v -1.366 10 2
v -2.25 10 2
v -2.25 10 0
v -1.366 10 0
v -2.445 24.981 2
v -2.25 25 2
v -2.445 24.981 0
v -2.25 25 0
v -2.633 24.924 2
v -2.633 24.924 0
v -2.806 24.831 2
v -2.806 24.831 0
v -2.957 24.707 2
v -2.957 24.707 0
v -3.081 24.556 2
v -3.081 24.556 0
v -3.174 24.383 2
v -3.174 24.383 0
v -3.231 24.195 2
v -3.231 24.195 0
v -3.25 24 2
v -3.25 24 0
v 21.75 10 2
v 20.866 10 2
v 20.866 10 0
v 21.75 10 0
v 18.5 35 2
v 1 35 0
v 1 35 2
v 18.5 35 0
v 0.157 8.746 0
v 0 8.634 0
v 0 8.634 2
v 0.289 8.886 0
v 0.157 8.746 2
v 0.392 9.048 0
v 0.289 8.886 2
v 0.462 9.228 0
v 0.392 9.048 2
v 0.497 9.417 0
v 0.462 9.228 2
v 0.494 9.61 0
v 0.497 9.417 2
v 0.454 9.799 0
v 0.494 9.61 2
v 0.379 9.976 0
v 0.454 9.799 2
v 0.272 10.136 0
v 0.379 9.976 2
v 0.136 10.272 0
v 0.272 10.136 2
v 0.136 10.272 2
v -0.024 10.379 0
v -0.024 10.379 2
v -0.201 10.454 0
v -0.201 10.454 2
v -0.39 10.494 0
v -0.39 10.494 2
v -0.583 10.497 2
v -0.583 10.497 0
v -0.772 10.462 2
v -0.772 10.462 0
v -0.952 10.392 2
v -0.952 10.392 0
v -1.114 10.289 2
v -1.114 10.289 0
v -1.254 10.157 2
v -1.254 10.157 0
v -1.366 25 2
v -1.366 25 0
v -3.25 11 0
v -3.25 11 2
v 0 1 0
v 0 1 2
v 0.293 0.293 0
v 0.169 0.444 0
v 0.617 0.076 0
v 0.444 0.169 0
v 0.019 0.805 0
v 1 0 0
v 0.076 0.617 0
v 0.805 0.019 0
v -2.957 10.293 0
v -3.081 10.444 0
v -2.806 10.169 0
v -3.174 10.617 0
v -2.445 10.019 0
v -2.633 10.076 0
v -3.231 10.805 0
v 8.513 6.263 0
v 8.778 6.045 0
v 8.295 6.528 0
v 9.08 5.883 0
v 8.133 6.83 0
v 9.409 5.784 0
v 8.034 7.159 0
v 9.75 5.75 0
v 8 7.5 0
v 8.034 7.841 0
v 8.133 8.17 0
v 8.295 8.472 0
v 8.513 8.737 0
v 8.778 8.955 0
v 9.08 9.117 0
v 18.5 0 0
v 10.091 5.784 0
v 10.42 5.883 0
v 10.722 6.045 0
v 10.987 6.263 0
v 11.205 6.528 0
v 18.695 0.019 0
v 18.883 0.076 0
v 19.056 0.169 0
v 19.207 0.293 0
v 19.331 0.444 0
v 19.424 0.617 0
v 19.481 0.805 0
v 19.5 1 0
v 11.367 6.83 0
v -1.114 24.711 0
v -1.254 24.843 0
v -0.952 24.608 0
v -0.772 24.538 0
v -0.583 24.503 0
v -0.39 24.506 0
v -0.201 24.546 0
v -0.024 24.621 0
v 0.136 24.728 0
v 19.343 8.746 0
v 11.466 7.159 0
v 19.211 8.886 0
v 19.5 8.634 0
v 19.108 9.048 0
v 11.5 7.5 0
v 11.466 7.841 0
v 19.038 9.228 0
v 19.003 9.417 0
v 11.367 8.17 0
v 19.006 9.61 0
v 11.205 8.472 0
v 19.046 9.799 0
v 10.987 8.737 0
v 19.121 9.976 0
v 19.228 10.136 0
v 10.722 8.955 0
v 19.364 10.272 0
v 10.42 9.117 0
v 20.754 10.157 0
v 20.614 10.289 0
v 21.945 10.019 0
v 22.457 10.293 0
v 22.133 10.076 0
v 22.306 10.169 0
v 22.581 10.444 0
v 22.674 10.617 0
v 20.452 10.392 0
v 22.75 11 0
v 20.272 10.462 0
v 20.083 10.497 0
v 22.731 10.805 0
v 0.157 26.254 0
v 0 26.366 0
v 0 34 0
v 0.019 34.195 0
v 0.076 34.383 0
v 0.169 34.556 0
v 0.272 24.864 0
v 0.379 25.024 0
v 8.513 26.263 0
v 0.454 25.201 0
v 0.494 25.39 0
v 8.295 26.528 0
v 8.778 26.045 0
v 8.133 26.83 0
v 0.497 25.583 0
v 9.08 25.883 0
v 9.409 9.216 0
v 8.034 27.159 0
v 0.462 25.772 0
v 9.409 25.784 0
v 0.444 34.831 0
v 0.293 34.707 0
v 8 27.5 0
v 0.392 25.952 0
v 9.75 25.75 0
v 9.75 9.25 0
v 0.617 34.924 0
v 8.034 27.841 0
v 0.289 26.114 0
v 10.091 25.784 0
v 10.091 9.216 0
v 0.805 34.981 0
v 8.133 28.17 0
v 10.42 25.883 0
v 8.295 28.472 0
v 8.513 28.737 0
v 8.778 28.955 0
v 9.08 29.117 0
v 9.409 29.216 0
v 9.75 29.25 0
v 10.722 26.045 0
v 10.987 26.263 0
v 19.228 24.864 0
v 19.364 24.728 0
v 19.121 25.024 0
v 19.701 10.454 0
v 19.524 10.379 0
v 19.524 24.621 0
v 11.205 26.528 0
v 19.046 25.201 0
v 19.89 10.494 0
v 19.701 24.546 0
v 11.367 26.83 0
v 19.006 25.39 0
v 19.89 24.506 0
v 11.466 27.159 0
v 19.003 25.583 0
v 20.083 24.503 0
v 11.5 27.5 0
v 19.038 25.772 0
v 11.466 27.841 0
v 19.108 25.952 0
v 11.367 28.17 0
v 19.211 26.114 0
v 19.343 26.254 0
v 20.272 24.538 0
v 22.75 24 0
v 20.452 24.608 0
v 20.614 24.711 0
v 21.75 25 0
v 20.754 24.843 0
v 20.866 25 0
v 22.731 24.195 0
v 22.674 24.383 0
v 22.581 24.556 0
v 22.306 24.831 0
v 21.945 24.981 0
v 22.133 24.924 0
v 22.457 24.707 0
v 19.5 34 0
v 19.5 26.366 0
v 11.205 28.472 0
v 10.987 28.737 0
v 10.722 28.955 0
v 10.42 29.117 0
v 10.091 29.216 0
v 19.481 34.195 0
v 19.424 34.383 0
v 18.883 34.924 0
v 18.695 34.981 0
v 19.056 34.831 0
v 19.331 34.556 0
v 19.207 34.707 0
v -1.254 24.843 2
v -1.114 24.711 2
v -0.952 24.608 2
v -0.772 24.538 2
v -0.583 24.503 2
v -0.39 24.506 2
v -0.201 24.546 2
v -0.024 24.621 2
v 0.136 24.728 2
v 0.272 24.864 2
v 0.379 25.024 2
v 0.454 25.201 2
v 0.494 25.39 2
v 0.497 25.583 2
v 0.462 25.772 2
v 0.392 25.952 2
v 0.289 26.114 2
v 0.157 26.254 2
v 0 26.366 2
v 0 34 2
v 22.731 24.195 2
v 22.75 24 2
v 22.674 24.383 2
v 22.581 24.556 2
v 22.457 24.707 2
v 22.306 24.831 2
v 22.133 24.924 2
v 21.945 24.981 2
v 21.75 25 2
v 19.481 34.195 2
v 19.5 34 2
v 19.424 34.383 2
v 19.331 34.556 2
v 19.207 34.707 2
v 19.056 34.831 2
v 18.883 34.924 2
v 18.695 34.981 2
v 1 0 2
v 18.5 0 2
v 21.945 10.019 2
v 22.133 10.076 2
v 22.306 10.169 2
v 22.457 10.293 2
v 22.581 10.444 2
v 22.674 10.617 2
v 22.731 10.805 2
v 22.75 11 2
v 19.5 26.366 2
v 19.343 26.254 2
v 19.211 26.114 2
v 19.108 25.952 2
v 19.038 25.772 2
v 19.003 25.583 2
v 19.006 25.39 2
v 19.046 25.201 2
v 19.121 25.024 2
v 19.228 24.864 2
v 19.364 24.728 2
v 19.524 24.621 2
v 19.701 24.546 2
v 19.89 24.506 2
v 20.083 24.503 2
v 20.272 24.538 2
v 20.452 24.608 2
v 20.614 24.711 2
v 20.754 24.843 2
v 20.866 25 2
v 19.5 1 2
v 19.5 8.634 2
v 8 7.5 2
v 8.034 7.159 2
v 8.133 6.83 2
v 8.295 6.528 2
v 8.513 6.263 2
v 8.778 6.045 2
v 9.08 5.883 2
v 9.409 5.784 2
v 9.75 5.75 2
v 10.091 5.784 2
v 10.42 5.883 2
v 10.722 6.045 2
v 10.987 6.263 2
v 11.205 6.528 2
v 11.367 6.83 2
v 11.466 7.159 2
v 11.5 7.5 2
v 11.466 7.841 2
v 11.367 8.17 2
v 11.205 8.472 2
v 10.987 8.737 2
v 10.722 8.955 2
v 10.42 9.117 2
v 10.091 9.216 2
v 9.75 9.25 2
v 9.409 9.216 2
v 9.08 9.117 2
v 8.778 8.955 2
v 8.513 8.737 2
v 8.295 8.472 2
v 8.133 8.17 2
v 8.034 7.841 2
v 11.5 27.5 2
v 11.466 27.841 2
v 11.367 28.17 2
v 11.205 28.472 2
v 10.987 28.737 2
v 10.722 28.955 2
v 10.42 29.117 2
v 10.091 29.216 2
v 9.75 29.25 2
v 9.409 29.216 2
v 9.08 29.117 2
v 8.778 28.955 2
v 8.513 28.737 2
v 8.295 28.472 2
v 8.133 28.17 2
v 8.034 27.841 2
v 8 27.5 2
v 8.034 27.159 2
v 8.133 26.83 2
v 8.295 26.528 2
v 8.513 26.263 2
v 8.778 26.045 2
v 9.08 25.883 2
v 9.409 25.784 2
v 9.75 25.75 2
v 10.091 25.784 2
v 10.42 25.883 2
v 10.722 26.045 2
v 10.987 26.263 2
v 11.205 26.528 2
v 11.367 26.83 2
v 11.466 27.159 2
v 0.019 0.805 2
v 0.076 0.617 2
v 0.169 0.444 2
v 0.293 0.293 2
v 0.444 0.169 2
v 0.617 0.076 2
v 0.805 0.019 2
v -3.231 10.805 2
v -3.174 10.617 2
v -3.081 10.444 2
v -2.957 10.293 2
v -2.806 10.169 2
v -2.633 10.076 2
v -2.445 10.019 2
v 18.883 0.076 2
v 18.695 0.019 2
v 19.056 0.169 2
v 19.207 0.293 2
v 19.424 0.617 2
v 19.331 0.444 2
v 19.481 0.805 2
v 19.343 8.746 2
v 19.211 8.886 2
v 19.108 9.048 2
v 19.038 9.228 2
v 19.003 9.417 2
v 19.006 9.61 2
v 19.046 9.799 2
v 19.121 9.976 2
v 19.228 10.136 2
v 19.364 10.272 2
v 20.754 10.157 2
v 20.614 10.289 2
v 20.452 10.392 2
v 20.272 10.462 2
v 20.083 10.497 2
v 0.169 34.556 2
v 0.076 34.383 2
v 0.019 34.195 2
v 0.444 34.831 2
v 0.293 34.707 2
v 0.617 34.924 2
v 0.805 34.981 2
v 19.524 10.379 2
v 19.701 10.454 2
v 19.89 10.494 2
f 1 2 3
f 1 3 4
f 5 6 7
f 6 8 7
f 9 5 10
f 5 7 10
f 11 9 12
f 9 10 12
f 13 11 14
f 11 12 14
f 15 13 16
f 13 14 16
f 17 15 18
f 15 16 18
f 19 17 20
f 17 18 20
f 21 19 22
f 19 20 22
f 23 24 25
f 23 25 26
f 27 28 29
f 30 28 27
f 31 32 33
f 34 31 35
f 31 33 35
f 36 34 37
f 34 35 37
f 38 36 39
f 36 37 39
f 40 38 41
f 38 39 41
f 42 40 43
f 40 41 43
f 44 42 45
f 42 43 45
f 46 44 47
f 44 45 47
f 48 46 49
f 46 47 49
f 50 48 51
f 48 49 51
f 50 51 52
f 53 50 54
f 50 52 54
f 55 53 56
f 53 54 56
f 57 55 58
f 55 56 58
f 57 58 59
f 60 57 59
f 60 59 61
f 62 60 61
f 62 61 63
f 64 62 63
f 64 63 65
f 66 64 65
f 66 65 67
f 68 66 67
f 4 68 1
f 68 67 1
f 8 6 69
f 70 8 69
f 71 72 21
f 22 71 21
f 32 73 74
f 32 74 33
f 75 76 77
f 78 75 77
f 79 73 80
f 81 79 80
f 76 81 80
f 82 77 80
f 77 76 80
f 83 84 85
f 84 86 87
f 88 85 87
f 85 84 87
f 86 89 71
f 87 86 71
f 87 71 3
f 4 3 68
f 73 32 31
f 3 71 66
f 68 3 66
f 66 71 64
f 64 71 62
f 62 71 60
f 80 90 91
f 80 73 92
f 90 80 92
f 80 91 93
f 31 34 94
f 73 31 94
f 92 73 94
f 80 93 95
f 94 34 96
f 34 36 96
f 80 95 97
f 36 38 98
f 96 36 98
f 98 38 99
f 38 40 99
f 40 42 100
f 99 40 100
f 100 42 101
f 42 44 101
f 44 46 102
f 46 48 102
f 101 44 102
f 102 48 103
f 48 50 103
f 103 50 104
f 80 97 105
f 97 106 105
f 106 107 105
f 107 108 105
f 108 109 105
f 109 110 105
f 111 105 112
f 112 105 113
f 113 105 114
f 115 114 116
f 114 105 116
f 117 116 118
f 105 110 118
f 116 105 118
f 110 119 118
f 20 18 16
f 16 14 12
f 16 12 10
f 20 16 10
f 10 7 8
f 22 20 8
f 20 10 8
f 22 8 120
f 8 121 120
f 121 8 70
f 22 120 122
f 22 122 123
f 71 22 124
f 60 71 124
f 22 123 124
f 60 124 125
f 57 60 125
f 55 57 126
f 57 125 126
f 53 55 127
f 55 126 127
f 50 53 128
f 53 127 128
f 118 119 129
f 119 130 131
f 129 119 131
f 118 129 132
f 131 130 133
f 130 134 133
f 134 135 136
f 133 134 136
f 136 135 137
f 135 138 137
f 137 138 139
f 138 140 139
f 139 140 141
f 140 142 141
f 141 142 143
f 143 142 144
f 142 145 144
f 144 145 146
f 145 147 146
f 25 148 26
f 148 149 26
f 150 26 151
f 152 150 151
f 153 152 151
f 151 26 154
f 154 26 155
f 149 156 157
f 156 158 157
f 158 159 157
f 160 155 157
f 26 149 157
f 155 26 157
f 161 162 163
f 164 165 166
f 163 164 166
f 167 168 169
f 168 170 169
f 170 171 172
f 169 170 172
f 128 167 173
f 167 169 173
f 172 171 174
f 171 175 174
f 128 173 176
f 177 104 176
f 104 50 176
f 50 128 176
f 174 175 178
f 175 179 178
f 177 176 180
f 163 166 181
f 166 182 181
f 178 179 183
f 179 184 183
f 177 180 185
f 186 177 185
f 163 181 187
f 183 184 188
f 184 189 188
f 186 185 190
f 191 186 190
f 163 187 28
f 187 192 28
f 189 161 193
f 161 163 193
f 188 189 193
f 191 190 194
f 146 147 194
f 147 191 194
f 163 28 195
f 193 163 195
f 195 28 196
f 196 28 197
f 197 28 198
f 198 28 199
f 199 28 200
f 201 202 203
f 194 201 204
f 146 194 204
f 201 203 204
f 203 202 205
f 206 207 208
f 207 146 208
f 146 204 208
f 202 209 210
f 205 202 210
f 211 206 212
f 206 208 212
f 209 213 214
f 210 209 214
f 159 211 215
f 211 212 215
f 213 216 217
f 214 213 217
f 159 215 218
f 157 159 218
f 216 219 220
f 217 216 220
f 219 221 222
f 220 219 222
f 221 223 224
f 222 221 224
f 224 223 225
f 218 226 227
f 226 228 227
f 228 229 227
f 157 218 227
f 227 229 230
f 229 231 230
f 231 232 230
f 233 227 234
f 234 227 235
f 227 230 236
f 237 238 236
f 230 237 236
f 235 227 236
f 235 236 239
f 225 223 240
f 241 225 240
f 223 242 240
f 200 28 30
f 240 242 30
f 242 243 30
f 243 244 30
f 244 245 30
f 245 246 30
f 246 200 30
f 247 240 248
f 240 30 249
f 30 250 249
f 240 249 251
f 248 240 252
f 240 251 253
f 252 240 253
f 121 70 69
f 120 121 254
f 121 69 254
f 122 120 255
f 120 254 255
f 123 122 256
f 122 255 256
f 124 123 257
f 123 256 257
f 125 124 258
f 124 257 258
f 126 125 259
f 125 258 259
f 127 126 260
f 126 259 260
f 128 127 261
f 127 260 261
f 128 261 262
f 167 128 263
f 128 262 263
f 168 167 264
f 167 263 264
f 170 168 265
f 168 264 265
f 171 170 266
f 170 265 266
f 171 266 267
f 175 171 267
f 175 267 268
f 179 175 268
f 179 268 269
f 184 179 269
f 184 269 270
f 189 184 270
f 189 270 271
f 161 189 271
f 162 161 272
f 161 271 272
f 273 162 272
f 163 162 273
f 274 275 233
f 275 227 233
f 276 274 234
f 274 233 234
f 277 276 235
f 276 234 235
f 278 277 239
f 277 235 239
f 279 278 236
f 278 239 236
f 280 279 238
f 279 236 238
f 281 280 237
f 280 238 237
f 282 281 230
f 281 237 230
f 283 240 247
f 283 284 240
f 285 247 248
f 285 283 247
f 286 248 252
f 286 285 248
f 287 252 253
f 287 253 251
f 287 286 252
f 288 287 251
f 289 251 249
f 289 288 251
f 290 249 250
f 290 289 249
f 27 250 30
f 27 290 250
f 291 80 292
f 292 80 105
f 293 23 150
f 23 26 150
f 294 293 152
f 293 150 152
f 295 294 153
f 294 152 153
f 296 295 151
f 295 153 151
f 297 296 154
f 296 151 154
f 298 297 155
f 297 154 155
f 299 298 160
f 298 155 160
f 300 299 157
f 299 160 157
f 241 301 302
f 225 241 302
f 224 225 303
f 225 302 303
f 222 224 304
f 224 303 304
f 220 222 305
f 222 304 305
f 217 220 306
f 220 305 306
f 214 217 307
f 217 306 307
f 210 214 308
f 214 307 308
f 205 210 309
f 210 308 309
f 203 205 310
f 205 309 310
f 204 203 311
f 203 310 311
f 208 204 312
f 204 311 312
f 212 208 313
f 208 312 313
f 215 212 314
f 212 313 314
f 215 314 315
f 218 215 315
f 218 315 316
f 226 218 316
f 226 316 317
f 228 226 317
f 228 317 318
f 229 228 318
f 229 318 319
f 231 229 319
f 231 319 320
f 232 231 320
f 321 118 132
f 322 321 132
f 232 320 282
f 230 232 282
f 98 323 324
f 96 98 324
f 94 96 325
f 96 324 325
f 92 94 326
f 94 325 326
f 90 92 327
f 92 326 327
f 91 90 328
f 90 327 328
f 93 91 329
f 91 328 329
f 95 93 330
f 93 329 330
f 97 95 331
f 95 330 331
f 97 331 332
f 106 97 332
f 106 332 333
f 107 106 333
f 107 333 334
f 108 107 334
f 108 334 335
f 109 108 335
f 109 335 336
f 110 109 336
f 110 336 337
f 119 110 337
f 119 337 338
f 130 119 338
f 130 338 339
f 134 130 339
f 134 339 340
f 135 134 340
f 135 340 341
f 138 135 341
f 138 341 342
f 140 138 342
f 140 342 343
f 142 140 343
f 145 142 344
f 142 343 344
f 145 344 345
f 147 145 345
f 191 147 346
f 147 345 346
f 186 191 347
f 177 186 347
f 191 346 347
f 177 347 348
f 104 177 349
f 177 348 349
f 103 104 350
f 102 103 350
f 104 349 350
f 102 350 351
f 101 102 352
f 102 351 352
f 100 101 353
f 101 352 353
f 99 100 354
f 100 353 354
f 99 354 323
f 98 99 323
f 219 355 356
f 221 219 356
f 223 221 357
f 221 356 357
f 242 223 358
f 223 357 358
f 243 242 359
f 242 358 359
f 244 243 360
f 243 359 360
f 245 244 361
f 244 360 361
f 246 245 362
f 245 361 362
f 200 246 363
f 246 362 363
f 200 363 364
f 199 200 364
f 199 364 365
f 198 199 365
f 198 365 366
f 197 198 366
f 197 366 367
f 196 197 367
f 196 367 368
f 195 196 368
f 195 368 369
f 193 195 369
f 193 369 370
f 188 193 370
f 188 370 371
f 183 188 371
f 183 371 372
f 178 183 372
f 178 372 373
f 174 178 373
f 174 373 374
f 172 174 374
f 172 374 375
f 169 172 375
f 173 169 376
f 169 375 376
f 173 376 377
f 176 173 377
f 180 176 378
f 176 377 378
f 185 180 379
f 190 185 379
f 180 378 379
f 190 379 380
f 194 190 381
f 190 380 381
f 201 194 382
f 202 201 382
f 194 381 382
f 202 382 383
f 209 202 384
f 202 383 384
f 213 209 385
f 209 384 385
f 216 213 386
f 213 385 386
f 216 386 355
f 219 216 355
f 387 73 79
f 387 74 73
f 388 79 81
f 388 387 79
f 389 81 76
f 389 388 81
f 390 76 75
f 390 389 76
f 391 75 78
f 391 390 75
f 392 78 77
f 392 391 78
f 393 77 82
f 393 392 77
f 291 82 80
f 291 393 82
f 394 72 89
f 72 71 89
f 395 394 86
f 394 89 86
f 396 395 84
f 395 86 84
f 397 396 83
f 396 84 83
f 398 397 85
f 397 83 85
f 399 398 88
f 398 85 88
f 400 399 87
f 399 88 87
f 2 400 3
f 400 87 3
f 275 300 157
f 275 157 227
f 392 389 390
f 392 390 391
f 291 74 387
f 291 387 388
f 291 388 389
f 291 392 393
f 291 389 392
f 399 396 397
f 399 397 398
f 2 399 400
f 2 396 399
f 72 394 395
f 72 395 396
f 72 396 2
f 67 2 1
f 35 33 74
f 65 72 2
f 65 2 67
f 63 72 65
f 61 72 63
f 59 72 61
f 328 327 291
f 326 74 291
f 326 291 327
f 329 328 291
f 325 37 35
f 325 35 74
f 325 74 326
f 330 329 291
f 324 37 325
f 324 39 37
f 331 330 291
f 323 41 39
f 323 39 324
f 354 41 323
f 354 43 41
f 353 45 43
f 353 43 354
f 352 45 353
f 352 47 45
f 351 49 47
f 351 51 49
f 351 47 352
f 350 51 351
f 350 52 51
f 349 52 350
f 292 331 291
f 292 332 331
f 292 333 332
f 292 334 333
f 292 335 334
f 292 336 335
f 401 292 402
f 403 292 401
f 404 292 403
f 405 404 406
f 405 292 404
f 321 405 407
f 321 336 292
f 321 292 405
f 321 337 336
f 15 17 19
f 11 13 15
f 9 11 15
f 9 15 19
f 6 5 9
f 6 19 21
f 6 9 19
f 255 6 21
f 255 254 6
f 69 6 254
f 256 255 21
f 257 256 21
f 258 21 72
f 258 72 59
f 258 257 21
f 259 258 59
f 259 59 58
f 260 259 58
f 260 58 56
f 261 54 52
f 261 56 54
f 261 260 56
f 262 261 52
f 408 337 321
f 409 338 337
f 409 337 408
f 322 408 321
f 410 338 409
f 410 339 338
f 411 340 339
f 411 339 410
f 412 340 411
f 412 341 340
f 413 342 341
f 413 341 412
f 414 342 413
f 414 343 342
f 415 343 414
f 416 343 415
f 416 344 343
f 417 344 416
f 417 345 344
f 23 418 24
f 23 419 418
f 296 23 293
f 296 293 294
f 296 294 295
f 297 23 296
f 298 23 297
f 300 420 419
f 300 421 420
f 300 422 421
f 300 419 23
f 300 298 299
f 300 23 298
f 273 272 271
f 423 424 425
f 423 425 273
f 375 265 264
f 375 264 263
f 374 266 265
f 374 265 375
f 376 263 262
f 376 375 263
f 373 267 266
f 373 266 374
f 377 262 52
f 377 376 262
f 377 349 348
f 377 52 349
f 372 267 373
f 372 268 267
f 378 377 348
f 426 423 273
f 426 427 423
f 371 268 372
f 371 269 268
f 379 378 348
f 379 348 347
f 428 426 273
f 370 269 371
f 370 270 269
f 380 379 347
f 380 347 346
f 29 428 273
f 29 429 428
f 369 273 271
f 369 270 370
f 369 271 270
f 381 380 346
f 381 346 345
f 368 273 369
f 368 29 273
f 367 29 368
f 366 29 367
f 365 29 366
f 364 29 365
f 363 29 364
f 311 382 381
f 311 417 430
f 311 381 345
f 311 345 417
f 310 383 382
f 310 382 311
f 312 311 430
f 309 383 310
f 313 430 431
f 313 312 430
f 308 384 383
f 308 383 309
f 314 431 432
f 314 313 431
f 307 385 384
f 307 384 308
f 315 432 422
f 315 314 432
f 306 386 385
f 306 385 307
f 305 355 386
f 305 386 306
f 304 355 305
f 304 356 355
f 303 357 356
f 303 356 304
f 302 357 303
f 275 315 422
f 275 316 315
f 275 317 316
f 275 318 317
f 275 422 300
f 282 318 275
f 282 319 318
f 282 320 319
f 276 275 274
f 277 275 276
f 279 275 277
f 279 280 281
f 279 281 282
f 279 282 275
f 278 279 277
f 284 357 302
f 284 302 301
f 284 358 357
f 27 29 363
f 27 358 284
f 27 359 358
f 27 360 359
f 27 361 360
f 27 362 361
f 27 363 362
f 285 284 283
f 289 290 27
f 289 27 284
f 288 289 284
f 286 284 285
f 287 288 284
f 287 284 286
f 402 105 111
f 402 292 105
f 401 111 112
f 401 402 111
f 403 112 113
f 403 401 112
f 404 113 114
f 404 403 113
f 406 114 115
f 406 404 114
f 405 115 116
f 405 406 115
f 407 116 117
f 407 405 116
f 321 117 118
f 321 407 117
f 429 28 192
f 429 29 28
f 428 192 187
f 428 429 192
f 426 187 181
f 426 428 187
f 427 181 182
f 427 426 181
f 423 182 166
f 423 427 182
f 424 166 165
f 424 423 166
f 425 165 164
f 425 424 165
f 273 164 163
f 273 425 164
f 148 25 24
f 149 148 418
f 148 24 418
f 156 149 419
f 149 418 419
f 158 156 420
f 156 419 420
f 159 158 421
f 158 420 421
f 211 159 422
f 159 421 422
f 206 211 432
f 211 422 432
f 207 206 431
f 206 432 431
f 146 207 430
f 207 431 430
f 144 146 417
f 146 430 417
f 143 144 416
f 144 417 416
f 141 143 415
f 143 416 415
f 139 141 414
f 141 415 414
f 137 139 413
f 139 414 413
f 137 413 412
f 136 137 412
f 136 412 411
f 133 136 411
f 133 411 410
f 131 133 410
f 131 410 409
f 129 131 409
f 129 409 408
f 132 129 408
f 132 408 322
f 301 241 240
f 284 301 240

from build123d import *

# Parameters (mm, degrees)
SKETCH_1_W          = 19.5
SKETCH_1_H          = 35
EXTRUDE_1_DEPTH     = 2
SKETCH_3_R          = 1.75
CUT_EXTRUDE_1_DEPTH = 41.115458367
SKETCH_4_W          = 3.25
SKETCH_4_H          = 15
EXTRUDE_2_DEPTH     = 2
SKETCH_5_R          = 1
CUT_EXTRUDE_2_DEPTH = 10
FILLET_1_R          = 1


with BuildPart() as part:
    # 草图1 → 凸台-拉伸1 (new body)
    with BuildSketch(Plane.XY):
        with Locations((9.75, 17.5)):
            Rectangle(SKETCH_1_W, SKETCH_1_H)
    extrude(amount=EXTRUDE_1_DEPTH)

    # 草图3 → 切除-拉伸1 (cut, through all)
    with BuildSketch(Plane.XY.offset(2)):
        with Locations((9.75, 27.5)):
            Circle(SKETCH_3_R)
        with Locations(Location((9.75, 7.5, 0), (0, 0, 180))):
            Circle(SKETCH_3_R)
    extrude(amount=-CUT_EXTRUDE_1_DEPTH, mode=Mode.SUBTRACT)

    # 草图4 → 凸台-拉伸2 (add)
    with BuildSketch(Plane.XY.offset(2)):
        with Locations((21.125, 17.5)):
            Rectangle(SKETCH_4_W, SKETCH_4_H)
        with Locations((-1.625, 17.5)):
            Rectangle(SKETCH_4_W, SKETCH_4_H)
    extrude(amount=-EXTRUDE_2_DEPTH)

    # 草图5 → 切除-拉伸2 (cut)
    with BuildSketch(Plane.XY.offset(2)):
        with Locations((20, 25.5)):
            Circle(SKETCH_5_R)
        with Locations((20, 9.5)):
            Circle(SKETCH_5_R)
        with Locations((-0.5, 9.5)):
            Circle(SKETCH_5_R)
        with Locations((-0.5, 25.5)):
            Circle(SKETCH_5_R)
    extrude(amount=-CUT_EXTRUDE_2_DEPTH, mode=Mode.SUBTRACT)

    # 圆角1
    fillet_1_edges = [part.edges().sort_by_distance(p)[0] for p in [
        (22.75, 10, 1),
        (22.75, 25, 1),
        (-3.25, 10, 1),
        (-3.25, 25, 1),
        (19.5, 35, 1),
        (19.5, 0, 1),
        (0, 0, 1),
        (0, 35, 1),
    ]]
    fillet(fillet_1_edges, radius=FILLET_1_R)


solid = part.part
